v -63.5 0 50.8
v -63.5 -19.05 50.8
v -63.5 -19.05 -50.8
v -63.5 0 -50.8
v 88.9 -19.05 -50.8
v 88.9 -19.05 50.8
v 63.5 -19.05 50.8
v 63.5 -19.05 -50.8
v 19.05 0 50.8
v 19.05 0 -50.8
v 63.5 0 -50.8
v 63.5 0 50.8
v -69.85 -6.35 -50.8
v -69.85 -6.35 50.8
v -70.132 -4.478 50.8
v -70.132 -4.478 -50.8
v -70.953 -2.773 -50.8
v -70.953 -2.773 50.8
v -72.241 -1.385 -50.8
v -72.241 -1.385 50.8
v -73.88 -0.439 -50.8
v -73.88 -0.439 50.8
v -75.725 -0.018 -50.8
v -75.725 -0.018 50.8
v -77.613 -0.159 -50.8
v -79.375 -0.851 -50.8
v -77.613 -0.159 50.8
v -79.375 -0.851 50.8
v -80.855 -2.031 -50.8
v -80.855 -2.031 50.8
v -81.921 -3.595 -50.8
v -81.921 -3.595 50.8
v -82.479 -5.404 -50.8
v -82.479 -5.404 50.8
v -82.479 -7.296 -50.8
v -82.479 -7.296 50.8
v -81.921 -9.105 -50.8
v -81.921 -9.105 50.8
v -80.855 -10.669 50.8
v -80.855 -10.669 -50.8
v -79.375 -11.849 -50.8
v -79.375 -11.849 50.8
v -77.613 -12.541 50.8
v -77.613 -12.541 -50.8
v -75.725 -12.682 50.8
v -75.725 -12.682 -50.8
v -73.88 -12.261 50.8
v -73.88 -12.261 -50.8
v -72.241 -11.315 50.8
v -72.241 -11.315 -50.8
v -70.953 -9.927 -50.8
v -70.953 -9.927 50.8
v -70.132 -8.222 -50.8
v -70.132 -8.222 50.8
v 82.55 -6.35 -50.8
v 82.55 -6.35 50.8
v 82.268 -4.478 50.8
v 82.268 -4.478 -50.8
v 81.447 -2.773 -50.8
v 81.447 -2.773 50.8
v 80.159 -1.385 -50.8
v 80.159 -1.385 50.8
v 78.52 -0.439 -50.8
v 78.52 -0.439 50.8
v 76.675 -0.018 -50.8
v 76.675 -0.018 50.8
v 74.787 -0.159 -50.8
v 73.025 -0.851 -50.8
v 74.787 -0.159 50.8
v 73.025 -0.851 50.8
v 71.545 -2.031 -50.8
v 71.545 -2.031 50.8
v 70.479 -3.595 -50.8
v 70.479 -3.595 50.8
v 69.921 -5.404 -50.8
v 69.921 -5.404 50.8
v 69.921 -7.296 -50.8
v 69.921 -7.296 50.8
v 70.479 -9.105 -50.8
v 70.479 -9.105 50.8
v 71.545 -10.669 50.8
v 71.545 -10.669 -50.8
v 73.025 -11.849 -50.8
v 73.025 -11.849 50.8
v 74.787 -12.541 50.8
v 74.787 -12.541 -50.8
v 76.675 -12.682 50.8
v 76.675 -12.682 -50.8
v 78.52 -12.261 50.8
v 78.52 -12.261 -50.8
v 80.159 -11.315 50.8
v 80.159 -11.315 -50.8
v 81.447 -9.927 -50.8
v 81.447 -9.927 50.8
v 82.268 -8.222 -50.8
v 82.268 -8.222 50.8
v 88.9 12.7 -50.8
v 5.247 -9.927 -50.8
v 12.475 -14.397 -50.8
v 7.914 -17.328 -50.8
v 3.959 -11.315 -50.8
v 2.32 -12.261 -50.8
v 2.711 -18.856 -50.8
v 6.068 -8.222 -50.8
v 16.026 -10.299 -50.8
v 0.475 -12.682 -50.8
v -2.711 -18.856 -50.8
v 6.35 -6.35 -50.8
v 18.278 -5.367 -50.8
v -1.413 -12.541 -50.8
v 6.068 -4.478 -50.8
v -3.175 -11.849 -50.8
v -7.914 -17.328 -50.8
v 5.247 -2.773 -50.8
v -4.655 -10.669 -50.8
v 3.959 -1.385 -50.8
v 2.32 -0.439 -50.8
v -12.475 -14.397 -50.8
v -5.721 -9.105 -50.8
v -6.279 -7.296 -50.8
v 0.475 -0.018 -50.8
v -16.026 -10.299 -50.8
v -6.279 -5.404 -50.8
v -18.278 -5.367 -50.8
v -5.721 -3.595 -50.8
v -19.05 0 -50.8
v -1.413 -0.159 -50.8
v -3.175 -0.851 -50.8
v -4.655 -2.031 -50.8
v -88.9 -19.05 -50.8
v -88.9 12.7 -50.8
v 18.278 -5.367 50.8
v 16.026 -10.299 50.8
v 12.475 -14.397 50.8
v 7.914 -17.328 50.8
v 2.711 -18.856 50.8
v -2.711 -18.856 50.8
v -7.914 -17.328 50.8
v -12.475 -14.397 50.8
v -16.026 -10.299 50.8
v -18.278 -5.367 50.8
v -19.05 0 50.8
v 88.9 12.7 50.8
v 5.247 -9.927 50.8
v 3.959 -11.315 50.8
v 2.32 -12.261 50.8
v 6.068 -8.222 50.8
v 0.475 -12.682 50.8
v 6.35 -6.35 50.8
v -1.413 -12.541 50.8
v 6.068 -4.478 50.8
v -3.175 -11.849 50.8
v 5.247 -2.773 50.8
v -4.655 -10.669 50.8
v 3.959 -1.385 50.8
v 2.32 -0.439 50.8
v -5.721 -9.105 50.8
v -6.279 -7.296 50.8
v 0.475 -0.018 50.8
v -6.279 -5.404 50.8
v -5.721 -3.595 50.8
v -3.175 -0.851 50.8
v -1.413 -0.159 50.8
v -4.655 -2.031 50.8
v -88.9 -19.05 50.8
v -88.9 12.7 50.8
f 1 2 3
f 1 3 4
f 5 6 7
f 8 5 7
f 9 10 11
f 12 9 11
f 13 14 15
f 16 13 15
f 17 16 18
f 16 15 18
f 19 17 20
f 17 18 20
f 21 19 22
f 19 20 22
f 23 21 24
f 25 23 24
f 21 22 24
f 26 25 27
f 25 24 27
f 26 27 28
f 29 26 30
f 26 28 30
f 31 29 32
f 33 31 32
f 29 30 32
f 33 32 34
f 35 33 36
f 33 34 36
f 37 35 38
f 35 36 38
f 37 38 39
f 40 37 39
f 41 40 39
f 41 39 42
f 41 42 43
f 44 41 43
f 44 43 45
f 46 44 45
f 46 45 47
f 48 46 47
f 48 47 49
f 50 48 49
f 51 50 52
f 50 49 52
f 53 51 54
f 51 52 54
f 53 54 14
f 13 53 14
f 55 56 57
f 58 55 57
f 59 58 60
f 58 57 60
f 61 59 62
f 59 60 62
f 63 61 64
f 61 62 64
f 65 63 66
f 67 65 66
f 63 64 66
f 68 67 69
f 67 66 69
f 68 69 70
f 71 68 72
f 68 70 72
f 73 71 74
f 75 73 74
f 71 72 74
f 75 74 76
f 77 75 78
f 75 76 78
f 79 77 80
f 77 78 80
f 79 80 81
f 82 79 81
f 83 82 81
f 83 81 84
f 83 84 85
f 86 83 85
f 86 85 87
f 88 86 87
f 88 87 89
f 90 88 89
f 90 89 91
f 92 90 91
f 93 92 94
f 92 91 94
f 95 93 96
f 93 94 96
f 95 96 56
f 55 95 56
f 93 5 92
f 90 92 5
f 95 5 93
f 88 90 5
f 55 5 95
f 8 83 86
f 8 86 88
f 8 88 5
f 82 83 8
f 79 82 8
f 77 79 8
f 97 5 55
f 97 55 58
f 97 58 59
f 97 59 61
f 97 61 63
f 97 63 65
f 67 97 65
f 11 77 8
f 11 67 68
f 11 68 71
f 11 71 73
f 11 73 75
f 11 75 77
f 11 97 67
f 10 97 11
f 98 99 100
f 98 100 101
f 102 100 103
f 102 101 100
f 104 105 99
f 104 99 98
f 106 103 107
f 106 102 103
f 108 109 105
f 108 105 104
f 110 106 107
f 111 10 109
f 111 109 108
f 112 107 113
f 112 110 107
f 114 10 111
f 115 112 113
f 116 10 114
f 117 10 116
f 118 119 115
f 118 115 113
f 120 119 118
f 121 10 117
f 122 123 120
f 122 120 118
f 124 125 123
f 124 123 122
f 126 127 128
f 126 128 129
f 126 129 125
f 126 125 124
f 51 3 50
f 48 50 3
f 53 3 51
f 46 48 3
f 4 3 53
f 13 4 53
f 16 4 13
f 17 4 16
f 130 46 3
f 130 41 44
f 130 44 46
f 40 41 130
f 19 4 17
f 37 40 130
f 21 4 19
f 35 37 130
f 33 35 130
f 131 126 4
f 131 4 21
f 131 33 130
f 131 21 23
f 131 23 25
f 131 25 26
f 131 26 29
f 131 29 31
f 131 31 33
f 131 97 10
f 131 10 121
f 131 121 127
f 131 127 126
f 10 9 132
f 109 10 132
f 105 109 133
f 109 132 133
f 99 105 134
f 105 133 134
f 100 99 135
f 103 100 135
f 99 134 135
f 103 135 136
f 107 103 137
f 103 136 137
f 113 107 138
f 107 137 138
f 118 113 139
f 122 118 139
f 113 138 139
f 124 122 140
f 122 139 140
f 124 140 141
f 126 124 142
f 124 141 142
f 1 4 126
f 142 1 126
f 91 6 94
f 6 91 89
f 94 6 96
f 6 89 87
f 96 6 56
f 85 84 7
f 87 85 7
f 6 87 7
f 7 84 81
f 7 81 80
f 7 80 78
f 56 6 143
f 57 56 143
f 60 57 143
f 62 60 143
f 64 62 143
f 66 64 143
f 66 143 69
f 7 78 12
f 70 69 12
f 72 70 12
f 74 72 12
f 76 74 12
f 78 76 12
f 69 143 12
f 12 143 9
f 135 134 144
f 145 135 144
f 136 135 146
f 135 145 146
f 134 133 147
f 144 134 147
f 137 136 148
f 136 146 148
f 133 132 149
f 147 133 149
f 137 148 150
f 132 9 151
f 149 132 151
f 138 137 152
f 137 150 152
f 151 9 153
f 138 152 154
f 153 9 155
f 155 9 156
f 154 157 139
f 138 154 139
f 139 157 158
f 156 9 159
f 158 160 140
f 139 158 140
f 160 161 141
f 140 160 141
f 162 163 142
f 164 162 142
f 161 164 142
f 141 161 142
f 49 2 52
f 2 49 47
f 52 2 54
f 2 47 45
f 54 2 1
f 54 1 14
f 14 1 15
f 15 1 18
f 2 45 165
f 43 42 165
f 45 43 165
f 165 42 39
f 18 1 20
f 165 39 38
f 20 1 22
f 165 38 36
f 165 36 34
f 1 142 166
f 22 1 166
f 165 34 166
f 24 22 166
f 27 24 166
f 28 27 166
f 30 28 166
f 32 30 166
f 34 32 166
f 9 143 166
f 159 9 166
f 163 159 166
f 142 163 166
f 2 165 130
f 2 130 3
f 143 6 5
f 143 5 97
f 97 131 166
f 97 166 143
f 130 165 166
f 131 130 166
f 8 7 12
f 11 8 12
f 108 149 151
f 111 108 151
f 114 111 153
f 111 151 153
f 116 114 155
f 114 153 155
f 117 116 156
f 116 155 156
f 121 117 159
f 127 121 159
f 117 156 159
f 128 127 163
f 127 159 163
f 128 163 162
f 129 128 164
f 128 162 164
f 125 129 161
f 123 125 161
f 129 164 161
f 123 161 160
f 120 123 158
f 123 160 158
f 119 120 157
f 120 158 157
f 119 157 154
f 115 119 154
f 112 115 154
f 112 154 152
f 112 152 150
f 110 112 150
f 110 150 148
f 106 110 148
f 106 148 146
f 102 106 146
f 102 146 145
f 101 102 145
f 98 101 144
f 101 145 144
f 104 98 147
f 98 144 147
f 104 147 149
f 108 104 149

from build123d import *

# Parameters (mm, degrees)
SKETCH1_W           = 177.8
SKETCH1_H           = 101.6
BOSS_EXTRUDE1_DEPTH = 12.7
BOSS_EXTRUDE2_DEPTH = 101.6
SKETCH3_R           = 6.35
CUT_EXTRUDE1_DEPTH  = 101.6
SKETCH4_W           = 25.4
SKETCH4_H           = 19.05
BOSS_EXTRUDE3_DEPTH = 101.6
SKETCH5_R           = 6.35
CUT_EXTRUDE2_DEPTH  = 101.6


with BuildPart() as part:
    # Sketch1 → Boss-Extrude1 (new body)
    with BuildSketch(Plane(origin=(0, 0, 0), x_dir=(1, 0, 0), z_dir=(0, 1, 0))):
        Rectangle(SKETCH1_W, SKETCH1_H)
    extrude(amount=BOSS_EXTRUDE1_DEPTH)

    # Sketch2 → Boss-Extrude2 (add)
    with BuildSketch(Plane.XY.offset(50.8)):
        with BuildLine():
            Line((-19.05, 0), (19.05, 0))
            ThreePointArc((19.05, 0), (0, -19.05), (-19.05, 0))
        make_face()
    extrude(amount=-BOSS_EXTRUDE2_DEPTH)

    # Sketch3 → Cut-Extrude1 (cut)
    with BuildSketch(Plane.XY.offset(50.8)):
        with Locations((0, -6.35)):
            Circle(SKETCH3_R)
    extrude(amount=-CUT_EXTRUDE1_DEPTH, mode=Mode.SUBTRACT)

    # Sketch4 → Boss-Extrude3 (add)
    with BuildSketch(Plane.XY.offset(50.8)):
        with Locations((-76.2, -9.525)):
            Rectangle(SKETCH4_W, SKETCH4_H)
    boss_extrude3 = extrude(amount=-BOSS_EXTRUDE3_DEPTH)

    # Mirror1: Boss-Extrude3 across plane
    add(boss_extrude3.mirror(Plane(origin=(0, 0, 0), x_dir=(0, 0, 1), z_dir=(1, 0, 0))))

    # Sketch5 → Cut-Extrude2 (cut)
    with BuildSketch(Plane.XY.offset(50.8)):
        with Locations((-76.2, -6.35)):
            Circle(SKETCH5_R)
        with Locations((76.2, -6.35)):
            Circle(SKETCH5_R)
    extrude(amount=-CUT_EXTRUDE2_DEPTH, mode=Mode.SUBTRACT)


solid = part.part
